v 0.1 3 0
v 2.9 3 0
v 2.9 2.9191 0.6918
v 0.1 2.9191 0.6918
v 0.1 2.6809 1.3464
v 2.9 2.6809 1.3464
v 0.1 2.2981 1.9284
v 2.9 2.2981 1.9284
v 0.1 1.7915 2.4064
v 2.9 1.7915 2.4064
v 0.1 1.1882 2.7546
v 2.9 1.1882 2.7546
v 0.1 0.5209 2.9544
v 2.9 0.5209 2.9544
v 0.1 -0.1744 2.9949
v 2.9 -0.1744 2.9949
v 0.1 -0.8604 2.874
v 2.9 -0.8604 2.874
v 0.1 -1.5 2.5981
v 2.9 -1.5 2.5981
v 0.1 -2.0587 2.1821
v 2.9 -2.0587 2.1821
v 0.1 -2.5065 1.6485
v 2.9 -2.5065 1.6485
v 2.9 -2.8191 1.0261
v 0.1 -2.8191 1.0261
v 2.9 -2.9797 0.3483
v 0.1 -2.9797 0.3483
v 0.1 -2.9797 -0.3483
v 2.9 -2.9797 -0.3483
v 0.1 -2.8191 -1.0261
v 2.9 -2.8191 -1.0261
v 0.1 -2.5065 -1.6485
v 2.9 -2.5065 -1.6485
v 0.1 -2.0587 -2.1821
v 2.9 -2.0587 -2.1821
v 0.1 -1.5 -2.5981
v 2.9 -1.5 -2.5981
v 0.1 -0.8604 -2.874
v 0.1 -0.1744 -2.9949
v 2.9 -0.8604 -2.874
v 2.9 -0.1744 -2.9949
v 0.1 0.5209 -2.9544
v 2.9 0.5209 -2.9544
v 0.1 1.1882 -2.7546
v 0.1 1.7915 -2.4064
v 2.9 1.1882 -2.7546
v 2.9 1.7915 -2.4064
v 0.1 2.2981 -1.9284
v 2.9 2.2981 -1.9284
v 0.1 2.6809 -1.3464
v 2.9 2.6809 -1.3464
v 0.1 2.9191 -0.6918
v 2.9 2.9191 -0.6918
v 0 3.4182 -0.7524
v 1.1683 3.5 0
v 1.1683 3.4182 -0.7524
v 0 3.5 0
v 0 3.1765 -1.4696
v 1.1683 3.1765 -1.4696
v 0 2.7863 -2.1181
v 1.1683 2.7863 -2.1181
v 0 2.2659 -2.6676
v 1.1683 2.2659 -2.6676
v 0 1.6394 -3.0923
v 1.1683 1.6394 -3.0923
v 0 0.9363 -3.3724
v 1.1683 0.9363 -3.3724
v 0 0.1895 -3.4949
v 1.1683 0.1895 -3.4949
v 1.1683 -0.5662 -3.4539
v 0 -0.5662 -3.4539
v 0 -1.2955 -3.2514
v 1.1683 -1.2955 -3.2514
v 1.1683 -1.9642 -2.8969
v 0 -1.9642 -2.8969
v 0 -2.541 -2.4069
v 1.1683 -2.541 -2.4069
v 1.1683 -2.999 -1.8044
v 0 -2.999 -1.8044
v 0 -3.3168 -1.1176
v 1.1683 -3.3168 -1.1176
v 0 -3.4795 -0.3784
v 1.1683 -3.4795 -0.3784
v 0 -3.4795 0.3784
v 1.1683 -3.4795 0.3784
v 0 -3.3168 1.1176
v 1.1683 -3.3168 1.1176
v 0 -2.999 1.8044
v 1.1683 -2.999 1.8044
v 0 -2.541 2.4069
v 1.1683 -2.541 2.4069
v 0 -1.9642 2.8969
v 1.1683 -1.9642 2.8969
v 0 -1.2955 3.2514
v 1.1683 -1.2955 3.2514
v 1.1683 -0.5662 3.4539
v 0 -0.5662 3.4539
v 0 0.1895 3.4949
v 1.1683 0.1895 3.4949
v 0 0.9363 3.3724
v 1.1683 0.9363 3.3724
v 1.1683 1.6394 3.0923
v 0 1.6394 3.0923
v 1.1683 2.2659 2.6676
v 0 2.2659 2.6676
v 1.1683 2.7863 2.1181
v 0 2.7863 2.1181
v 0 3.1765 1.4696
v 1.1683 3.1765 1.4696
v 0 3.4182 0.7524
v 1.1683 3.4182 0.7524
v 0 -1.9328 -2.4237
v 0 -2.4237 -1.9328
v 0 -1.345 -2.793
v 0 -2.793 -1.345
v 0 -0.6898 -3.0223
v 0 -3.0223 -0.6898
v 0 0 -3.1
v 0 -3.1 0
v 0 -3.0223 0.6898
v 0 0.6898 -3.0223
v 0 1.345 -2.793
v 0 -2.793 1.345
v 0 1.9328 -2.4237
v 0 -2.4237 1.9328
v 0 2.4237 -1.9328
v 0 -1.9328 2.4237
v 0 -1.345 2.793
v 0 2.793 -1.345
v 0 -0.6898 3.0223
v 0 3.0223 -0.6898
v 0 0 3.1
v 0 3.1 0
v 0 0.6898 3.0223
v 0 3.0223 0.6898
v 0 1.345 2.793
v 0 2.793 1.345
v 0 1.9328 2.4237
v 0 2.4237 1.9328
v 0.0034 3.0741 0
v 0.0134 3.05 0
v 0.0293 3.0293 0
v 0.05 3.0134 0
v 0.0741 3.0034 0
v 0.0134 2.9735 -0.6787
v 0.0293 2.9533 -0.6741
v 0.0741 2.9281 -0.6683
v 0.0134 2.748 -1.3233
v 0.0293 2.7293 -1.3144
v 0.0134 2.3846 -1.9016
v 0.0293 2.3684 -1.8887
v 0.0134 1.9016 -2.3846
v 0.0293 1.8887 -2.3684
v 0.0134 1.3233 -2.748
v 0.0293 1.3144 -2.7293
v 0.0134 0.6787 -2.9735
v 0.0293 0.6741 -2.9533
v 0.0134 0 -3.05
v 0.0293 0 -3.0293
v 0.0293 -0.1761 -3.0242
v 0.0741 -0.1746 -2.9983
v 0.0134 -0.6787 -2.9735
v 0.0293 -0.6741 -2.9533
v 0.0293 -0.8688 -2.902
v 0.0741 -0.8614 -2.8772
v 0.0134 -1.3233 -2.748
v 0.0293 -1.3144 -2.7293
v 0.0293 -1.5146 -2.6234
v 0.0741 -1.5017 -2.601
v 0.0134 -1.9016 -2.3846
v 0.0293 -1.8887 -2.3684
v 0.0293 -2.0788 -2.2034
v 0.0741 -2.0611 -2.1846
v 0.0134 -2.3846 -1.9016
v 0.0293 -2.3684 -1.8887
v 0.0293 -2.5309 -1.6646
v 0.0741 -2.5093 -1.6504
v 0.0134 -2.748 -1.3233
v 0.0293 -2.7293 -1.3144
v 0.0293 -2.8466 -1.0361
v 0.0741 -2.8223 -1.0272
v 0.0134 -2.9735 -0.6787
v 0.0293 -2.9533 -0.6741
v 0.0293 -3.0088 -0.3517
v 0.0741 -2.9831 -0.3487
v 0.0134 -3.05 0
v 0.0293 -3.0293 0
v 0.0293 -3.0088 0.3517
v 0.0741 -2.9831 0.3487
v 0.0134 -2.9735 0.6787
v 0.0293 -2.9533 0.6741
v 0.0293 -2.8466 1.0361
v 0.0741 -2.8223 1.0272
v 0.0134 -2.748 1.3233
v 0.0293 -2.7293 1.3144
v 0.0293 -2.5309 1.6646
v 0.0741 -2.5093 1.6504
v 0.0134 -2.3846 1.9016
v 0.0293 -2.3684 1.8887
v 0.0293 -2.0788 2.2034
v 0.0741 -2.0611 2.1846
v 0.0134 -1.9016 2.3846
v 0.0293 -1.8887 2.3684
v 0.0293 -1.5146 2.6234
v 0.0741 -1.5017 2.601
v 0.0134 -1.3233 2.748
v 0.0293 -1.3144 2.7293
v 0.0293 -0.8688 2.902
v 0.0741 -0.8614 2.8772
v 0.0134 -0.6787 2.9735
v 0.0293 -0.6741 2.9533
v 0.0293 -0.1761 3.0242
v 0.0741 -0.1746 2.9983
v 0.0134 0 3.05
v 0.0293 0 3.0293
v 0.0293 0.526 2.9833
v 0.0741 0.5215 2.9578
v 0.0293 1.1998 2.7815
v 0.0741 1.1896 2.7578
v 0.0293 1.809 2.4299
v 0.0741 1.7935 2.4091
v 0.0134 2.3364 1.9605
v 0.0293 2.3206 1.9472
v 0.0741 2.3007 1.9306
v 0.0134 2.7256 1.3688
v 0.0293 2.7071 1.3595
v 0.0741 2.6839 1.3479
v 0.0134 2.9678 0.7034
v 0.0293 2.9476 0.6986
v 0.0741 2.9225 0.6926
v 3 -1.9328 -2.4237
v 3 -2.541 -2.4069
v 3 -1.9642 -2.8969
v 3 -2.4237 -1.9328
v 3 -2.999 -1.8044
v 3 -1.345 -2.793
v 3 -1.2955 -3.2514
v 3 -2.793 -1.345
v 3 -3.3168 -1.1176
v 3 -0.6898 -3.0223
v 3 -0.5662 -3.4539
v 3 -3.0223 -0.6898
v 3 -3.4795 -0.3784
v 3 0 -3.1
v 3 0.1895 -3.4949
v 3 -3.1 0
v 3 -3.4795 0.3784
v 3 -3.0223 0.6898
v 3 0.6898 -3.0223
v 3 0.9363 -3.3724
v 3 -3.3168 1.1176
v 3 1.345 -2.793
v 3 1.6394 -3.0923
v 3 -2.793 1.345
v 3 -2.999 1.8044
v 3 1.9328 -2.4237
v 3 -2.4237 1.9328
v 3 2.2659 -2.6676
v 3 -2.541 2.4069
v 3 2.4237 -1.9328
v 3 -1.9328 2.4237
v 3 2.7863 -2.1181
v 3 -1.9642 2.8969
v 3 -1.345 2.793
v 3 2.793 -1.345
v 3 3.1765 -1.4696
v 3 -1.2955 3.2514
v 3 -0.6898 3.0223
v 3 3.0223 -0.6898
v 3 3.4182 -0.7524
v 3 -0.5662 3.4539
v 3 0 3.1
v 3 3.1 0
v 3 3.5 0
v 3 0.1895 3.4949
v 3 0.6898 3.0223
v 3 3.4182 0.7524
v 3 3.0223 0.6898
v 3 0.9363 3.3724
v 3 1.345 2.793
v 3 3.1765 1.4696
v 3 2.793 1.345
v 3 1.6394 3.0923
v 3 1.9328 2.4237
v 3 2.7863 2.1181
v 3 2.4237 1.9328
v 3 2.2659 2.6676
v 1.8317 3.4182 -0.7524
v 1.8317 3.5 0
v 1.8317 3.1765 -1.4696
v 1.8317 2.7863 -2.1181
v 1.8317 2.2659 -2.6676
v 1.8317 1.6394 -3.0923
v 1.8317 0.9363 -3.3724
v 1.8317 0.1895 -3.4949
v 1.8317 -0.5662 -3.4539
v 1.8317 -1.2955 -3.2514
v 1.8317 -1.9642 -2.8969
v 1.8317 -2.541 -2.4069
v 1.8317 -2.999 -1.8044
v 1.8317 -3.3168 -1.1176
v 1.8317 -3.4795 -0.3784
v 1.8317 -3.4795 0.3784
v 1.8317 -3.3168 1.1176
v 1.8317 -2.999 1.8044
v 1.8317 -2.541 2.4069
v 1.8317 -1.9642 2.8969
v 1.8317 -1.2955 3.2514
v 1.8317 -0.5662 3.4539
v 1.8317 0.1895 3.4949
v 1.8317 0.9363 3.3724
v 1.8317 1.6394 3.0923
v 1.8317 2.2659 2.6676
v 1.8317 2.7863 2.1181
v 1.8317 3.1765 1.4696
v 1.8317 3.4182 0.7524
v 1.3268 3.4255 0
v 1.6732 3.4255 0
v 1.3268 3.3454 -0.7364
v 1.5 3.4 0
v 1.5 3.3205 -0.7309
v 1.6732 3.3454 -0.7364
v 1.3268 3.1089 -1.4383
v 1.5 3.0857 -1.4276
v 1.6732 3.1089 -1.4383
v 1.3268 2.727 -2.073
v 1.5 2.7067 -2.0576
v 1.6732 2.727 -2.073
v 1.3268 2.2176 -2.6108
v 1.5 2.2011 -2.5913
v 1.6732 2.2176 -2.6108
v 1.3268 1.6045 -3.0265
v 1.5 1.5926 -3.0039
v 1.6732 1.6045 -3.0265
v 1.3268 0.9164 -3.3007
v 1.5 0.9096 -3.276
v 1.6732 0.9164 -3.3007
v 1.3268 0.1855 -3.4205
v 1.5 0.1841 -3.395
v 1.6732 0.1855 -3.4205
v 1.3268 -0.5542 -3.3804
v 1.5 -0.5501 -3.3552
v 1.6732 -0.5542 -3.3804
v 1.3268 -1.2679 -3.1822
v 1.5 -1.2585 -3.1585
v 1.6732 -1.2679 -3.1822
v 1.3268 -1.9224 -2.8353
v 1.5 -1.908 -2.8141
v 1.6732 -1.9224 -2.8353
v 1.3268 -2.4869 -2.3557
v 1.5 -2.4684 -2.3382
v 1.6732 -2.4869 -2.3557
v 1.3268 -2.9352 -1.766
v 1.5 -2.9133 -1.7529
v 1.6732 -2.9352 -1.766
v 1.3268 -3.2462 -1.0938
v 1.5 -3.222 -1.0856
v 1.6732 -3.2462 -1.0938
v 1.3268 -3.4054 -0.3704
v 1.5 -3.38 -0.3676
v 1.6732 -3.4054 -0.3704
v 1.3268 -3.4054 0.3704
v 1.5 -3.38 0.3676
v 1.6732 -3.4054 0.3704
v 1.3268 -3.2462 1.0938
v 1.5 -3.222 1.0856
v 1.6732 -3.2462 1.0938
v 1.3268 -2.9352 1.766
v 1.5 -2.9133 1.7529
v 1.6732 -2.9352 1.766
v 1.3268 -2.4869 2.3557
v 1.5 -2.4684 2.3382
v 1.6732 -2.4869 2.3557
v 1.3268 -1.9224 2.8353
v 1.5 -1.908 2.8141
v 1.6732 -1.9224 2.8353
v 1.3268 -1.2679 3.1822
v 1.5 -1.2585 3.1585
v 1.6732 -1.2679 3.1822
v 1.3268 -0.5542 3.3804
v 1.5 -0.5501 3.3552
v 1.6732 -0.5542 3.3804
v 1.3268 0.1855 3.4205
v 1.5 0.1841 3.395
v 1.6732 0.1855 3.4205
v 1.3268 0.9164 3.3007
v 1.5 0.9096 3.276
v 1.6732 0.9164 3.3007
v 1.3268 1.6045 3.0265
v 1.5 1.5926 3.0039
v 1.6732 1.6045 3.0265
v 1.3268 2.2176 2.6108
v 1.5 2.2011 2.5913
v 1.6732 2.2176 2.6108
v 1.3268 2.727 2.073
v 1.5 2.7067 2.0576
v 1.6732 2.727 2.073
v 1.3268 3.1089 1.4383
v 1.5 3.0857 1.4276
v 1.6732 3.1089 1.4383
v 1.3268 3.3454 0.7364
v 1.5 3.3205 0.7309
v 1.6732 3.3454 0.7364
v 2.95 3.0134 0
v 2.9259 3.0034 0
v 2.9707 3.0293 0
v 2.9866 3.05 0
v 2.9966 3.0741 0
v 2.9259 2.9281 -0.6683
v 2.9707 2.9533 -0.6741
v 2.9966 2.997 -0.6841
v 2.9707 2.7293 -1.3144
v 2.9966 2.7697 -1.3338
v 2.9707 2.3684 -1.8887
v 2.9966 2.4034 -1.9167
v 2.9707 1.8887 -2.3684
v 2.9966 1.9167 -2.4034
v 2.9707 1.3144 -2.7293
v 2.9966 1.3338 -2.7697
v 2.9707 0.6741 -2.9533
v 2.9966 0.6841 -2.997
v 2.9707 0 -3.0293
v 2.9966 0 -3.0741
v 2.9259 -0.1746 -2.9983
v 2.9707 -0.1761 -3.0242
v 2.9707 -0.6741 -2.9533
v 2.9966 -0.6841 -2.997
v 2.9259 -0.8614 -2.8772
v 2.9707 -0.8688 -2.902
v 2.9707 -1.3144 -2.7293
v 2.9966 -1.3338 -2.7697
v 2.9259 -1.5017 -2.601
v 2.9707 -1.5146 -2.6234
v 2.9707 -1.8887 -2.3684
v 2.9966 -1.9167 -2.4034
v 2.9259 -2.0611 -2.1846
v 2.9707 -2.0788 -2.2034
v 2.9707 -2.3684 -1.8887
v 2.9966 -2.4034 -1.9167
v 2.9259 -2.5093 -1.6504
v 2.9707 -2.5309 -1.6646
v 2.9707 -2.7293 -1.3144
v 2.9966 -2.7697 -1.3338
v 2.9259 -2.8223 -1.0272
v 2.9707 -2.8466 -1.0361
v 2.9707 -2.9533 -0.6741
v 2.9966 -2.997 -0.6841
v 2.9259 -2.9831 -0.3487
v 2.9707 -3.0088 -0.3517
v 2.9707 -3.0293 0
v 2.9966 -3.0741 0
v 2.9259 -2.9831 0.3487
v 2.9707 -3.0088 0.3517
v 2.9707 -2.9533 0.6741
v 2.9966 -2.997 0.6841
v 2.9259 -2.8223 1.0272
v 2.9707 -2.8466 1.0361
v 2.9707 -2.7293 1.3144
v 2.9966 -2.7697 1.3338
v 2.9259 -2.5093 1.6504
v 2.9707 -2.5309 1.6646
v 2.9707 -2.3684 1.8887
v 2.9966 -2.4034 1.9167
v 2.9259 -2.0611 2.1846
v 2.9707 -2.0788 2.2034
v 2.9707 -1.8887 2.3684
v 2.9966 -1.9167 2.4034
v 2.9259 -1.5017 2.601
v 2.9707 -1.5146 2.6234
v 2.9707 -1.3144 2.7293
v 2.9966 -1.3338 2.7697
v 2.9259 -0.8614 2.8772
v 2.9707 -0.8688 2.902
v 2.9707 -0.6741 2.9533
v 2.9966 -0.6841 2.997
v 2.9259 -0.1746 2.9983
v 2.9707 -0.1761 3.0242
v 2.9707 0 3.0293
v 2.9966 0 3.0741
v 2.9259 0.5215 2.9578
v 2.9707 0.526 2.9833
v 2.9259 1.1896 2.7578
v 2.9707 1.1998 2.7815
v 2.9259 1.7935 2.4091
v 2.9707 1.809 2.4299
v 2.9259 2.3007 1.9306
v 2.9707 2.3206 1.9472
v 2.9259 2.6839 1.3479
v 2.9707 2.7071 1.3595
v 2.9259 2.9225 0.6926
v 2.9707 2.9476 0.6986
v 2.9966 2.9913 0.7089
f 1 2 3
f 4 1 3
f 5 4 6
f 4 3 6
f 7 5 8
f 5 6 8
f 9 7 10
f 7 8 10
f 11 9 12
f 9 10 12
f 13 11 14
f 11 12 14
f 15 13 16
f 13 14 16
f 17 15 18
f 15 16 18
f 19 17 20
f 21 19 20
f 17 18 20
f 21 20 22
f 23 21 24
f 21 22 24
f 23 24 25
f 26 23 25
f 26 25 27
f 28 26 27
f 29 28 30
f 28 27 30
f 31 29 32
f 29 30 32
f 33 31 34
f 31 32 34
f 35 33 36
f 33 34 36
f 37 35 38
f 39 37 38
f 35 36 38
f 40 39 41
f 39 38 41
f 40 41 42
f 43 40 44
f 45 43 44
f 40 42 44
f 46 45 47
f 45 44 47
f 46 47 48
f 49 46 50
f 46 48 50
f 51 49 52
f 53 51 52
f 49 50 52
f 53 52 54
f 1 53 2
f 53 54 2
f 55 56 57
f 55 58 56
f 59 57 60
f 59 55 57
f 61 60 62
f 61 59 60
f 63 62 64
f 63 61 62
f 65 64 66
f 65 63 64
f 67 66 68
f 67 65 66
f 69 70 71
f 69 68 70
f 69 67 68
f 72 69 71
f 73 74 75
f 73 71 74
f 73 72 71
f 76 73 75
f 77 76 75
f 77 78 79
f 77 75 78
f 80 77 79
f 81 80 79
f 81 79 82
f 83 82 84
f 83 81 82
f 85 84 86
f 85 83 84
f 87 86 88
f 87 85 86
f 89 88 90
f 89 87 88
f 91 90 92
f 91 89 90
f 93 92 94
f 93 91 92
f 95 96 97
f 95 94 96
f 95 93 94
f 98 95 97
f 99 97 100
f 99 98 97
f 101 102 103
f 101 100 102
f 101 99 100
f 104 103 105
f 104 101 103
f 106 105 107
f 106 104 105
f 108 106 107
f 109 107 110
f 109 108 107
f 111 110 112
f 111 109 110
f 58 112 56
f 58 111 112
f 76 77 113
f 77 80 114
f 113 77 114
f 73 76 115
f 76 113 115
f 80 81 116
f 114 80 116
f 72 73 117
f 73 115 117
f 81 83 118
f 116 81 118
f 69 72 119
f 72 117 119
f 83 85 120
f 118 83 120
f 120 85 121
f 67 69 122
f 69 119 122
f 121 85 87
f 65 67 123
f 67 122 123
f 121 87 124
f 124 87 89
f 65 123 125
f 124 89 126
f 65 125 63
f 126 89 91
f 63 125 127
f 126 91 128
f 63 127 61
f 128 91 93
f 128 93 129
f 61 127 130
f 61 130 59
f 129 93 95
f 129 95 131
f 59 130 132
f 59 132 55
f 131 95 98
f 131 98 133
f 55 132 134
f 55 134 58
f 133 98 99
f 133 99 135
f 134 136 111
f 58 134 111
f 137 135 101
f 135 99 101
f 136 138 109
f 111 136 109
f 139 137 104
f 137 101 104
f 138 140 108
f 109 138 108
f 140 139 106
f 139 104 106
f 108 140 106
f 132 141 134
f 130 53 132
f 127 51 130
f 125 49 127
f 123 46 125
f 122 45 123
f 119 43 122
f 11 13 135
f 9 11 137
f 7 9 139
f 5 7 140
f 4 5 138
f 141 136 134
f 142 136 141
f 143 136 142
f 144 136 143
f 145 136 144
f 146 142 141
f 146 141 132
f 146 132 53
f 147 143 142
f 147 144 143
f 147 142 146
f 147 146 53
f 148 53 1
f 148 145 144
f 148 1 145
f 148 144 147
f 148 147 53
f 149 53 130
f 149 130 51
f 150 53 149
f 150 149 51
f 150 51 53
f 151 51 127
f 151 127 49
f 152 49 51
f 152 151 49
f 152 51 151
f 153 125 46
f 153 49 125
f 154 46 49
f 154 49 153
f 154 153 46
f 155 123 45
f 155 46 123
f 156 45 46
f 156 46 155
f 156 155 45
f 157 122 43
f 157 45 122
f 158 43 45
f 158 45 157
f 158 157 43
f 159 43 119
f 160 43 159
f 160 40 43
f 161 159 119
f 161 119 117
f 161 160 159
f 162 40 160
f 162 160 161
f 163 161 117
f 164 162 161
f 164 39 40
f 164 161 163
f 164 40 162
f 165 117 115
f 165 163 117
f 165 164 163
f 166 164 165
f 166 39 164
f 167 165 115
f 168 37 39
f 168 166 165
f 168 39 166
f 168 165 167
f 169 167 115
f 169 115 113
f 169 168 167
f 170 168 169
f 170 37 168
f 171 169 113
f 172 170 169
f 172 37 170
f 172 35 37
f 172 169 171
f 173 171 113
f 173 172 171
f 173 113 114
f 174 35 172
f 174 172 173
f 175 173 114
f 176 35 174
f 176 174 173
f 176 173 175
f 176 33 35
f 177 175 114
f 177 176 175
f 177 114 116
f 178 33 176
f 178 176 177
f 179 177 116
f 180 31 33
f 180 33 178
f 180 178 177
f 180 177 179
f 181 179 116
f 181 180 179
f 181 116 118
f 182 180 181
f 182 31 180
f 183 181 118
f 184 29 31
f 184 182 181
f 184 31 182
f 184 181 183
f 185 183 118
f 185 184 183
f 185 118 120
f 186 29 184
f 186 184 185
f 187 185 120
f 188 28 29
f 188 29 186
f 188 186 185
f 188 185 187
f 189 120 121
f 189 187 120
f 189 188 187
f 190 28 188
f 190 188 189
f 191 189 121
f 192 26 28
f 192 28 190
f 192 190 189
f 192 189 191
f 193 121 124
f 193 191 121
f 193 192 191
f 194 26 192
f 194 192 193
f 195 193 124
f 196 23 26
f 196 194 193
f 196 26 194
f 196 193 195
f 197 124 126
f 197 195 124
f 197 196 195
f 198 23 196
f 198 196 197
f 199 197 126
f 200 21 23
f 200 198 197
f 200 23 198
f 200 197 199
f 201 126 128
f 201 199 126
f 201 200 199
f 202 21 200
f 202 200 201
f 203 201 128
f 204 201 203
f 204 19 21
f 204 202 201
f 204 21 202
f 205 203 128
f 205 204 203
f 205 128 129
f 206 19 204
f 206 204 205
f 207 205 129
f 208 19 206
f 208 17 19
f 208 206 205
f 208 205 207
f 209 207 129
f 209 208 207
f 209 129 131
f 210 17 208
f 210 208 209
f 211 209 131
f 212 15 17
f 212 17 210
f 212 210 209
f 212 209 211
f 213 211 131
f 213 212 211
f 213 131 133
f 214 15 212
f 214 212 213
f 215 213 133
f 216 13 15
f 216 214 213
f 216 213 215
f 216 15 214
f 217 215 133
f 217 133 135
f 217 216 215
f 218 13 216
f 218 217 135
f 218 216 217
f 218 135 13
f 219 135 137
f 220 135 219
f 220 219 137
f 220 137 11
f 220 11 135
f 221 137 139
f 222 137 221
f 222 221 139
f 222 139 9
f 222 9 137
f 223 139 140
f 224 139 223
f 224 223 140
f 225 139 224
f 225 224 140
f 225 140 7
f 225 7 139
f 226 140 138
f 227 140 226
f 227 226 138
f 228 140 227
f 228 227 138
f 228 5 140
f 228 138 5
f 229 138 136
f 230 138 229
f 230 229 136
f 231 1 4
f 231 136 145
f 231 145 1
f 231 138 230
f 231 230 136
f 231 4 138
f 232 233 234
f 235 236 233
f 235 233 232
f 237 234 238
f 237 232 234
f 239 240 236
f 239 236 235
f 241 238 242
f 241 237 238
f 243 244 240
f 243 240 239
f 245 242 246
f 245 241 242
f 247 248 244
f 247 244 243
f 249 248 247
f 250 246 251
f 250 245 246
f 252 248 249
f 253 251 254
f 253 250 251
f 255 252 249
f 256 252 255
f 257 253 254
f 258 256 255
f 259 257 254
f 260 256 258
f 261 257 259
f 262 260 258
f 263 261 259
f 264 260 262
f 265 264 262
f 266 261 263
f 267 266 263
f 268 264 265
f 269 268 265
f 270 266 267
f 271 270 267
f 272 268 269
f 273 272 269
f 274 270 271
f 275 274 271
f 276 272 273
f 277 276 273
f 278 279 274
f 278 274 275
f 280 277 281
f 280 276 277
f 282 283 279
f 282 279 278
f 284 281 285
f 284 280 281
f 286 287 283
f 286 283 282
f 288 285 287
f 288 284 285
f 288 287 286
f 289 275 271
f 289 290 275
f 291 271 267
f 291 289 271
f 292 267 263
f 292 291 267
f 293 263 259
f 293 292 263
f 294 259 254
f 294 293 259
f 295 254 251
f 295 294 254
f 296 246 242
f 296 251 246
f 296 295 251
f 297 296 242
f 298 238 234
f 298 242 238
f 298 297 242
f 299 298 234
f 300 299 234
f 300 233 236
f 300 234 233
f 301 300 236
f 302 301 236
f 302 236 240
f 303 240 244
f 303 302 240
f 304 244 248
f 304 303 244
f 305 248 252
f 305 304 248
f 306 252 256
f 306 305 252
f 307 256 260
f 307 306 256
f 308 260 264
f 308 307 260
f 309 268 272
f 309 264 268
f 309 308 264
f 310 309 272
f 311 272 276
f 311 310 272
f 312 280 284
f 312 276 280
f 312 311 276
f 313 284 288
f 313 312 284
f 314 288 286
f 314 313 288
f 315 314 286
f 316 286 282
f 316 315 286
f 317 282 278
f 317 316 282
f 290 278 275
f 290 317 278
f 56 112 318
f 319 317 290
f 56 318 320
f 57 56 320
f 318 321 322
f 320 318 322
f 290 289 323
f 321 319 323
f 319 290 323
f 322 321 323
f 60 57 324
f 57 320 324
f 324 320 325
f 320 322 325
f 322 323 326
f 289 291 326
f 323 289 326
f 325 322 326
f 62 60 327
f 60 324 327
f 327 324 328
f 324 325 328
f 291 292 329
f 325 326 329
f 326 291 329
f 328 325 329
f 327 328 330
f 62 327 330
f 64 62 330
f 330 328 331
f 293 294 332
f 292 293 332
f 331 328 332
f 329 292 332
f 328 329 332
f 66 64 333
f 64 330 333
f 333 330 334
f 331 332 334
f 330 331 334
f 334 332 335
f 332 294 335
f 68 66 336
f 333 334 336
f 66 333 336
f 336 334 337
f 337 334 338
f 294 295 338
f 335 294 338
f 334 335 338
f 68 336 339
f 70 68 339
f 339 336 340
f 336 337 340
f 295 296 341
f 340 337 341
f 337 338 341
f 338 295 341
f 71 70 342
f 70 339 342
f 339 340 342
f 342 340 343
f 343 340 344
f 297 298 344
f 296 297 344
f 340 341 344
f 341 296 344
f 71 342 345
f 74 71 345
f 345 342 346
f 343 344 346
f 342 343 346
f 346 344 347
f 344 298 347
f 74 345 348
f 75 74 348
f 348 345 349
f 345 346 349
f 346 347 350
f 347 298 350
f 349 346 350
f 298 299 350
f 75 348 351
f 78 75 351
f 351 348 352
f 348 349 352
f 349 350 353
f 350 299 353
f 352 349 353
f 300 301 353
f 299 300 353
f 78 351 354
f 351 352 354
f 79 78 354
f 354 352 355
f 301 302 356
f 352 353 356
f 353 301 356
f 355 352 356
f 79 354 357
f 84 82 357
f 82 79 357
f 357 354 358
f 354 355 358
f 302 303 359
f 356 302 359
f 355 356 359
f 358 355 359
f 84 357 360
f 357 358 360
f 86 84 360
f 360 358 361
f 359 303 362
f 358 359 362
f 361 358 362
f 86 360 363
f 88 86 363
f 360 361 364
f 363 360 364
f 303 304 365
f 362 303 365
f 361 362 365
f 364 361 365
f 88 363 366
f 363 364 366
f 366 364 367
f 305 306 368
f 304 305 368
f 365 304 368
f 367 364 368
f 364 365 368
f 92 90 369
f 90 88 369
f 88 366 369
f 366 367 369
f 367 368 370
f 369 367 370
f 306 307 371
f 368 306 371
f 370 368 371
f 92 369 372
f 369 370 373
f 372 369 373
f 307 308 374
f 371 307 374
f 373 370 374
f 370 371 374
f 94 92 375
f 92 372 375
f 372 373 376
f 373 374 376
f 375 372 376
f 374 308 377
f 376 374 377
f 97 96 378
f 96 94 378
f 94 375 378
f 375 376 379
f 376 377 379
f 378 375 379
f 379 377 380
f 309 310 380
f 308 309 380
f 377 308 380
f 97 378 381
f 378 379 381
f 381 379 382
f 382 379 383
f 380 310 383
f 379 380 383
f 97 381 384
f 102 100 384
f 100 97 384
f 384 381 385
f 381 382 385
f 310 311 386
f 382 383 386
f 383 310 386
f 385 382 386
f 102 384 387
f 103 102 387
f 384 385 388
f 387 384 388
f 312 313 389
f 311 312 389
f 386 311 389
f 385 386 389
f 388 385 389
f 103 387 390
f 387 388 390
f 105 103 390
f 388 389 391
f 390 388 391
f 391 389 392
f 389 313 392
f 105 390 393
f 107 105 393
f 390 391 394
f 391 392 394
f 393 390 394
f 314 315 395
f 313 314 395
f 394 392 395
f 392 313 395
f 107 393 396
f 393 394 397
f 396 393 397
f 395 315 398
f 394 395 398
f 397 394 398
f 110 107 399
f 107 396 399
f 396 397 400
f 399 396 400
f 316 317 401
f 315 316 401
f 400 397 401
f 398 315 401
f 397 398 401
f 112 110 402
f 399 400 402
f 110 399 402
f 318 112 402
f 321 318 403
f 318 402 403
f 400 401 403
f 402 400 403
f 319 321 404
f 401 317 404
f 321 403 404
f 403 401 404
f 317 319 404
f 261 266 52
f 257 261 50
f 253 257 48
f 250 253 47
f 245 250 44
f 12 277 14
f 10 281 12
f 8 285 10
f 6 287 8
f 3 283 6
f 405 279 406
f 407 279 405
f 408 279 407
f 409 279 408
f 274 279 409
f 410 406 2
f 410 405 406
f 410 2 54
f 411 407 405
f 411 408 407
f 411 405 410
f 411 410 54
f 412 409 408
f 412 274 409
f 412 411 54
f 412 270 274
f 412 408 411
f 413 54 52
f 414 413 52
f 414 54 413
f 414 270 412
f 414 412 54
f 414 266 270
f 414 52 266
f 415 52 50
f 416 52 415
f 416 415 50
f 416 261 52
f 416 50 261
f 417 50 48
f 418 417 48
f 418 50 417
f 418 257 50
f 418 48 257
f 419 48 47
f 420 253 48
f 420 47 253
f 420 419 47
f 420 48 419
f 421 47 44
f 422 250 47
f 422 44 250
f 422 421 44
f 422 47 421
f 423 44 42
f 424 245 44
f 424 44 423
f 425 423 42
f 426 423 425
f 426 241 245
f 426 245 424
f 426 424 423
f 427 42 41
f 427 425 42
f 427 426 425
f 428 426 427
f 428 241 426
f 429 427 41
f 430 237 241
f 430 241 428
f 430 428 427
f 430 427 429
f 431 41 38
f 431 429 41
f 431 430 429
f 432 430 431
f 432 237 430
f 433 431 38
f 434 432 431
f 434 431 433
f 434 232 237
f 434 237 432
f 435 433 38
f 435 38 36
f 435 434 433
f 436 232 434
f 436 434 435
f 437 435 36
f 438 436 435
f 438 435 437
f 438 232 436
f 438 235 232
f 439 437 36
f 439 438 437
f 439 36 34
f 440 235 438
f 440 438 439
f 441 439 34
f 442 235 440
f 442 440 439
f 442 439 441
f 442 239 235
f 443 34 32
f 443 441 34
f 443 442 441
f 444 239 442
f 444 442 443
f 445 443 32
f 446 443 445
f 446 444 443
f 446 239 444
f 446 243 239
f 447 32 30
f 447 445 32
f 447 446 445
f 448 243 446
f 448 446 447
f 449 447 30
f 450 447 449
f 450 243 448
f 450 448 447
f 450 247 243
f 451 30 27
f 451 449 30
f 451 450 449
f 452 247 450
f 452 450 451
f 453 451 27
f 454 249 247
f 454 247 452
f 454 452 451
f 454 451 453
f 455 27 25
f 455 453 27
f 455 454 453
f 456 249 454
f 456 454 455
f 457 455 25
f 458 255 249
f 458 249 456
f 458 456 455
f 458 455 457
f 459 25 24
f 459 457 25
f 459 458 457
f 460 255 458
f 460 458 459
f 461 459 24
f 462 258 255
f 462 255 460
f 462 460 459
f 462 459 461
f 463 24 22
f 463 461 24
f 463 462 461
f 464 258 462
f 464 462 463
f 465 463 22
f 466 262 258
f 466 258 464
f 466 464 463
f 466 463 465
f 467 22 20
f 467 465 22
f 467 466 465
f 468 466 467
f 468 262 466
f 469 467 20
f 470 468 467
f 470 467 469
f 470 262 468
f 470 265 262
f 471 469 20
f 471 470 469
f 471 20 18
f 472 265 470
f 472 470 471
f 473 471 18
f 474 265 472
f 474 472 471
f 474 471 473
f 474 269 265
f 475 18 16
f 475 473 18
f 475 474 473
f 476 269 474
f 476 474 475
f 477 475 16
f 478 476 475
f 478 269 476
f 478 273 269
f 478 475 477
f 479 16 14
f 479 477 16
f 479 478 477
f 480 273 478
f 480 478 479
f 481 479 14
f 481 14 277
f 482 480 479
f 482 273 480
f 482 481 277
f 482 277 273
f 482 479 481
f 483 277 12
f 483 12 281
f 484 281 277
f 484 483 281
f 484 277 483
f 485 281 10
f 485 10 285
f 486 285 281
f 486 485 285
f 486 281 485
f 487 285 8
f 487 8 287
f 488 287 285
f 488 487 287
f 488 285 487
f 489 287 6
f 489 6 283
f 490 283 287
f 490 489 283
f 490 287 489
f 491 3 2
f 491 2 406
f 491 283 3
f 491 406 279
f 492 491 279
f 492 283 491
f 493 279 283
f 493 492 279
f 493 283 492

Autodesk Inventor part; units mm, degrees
sketch "Sketch_1" plane through (0, 0, 0) normal (0, 0, 1) x (1, 0, 0)
  line L0 (3, 0) -> (0, 0)
  arc A0 (0, 3.1) -> (0.1, 3) centre (0.1, 3.1) ccw
  line L1 (0.1, 3) -> (2.9, 3)
  arc A1 (2.9, 3) -> (3, 3.1) centre (2.9, 3.1) ccw
  line L2 (3, 3.1) -> (3, 3.5)
  line L3 (3, 3.5) -> (1.8317, 3.5)
  arc A2 (1.1683, 3.5) -> (1.8317, 3.5) centre (1.5, 4) ccw
  line L4 (1.1683, 3.5) -> (0, 3.5)
  line L5 (0, 3.5) -> (0, 3.1)
revolve "Revolution1" add sketch "Sketch_1" angle 360 about axis through (3, 0, 0) along (1, 0, 0)
ref_plane "ip_st_1_1_XY" through (1.5, 4, 0) normal (1, 0, 0) x (0, 0, -1)
ref_plane "ip_st_1_1_YZ" through (1.5, 4, 0) normal (0, 0, -1) x (0, 1, 0)
ref_plane "ip_st_1_1_ZX" through (1.5, 4, 0) normal (0, 1, 0) x (1, 0, 0)
ref_plane "ip_st_1_10_XY" through (1.5, -3.6955, -1.5307) normal (1, 0, 0) x (0, 0, -1)
ref_plane "ip_st_1_10_YZ" through (1.5, -3.6955, -1.5307) normal (0, 0, -1) x (0, 1, 0)
ref_plane "ip_st_1_10_ZX" through (1.5, -3.6955, -1.5307) normal (0, 1, 0) x (1, 0, 0)
ref_plane "ip_st_1_11_XY" through (1.5, -2.8284, -2.8284) normal (1, 0, 0) x (0, 0, -1)
ref_plane "ip_st_1_11_YZ" through (1.5, -2.8284, -2.8284) normal (0, 0, -1) x (0, 1, 0)
ref_plane "ip_st_1_11_ZX" through (1.5, -2.8284, -2.8284) normal (0, 1, 0) x (1, 0, 0)
ref_plane "ip_st_1_12_XY" through (1.5, -1.5307, -3.6955) normal (1, 0, 0) x (0, 0, -1)
ref_plane "ip_st_1_12_YZ" through (1.5, -1.5307, -3.6955) normal (0, 0, -1) x (0, 1, 0)
ref_plane "ip_st_1_12_ZX" through (1.5, -1.5307, -3.6955) normal (0, 1, 0) x (1, 0, 0)
ref_plane "ip_st_1_13_XY" through (1.5, 0, -4) normal (1, 0, 0) x (0, 0, -1)
ref_plane "ip_st_1_13_YZ" through (1.5, 0, -4) normal (0, 0, -1) x (0, 1, 0)
ref_plane "ip_st_1_13_ZX" through (1.5, 0, -4) normal (0, 1, 0) x (1, 0, 0)
ref_plane "ip_st_1_14_XY" through (1.5, 1.5307, -3.6955) normal (1, 0, 0) x (0, 0, -1)
ref_plane "ip_st_1_14_YZ" through (1.5, 1.5307, -3.6955) normal (0, 0, -1) x (0, 1, 0)
ref_plane "ip_st_1_14_ZX" through (1.5, 1.5307, -3.6955) normal (0, 1, 0) x (1, 0, 0)
ref_plane "ip_st_1_15_XY" through (1.5, 2.8284, -2.8284) normal (1, 0, 0) x (0, 0, -1)
ref_plane "ip_st_1_15_YZ" through (1.5, 2.8284, -2.8284) normal (0, 0, -1) x (0, 1, 0)
ref_plane "ip_st_1_15_ZX" through (1.5, 2.8284, -2.8284) normal (0, 1, 0) x (1, 0, 0)
ref_plane "ip_st_1_16_XY" through (1.5, 3.6955, -1.5307) normal (1, 0, 0) x (0, 0, -1)
ref_plane "ip_st_1_16_YZ" through (1.5, 3.6955, -1.5307) normal (0, 0, -1) x (0, 1, 0)
ref_plane "ip_st_1_16_ZX" through (1.5, 3.6955, -1.5307) normal (0, 1, 0) x (1, 0, 0)
ref_plane "ip_st_1_2_XY" through (1.5, 3.6955, 1.5307) normal (1, 0, 0) x (0, 0, -1)
ref_plane "ip_st_1_2_YZ" through (1.5, 3.6955, 1.5307) normal (0, 0, -1) x (0, 1, 0)
ref_plane "ip_st_1_2_ZX" through (1.5, 3.6955, 1.5307) normal (0, 1, 0) x (1, 0, 0)
ref_plane "ip_st_1_3_XY" through (1.5, 2.8284, 2.8284) normal (1, 0, 0) x (0, 0, -1)
ref_plane "ip_st_1_3_YZ" through (1.5, 2.8284, 2.8284) normal (0, 0, -1) x (0, 1, 0)
ref_plane "ip_st_1_3_ZX" through (1.5, 2.8284, 2.8284) normal (0, 1, 0) x (1, 0, 0)
ref_plane "ip_st_1_4_XY" through (1.5, 1.5307, 3.6955) normal (1, 0, 0) x (0, 0, -1)
ref_plane "ip_st_1_4_YZ" through (1.5, 1.5307, 3.6955) normal (0, 0, -1) x (0, 1, 0)
ref_plane "ip_st_1_4_ZX" through (1.5, 1.5307, 3.6955) normal (0, 1, 0) x (1, 0, 0)
ref_plane "ip_st_1_5_XY" through (1.5, 0, 4) normal (1, 0, 0) x (0, 0, -1)
ref_plane "ip_st_1_5_YZ" through (1.5, 0, 4) normal (0, 0, -1) x (0, 1, 0)
ref_plane "ip_st_1_5_ZX" through (1.5, 0, 4) normal (0, 1, 0) x (1, 0, 0)
ref_plane "ip_st_1_6_XY" through (1.5, -1.5307, 3.6955) normal (1, 0, 0) x (0, 0, -1)
ref_plane "ip_st_1_6_YZ" through (1.5, -1.5307, 3.6955) normal (0, 0, -1) x (0, 1, 0)
ref_plane "ip_st_1_6_ZX" through (1.5, -1.5307, 3.6955) normal (0, 1, 0) x (1, 0, 0)
ref_plane "ip_st_1_7_XY" through (1.5, -2.8284, 2.8284) normal (1, 0, 0) x (0, 0, -1)
ref_plane "ip_st_1_7_YZ" through (1.5, -2.8284, 2.8284) normal (0, 0, -1) x (0, 1, 0)
ref_plane "ip_st_1_7_ZX" through (1.5, -2.8284, 2.8284) normal (0, 1, 0) x (1, 0, 0)
ref_plane "ip_st_1_8_XY" through (1.5, -3.6955, 1.5307) normal (1, 0, 0) x (0, 0, -1)
ref_plane "ip_st_1_8_YZ" through (1.5, -3.6955, 1.5307) normal (0, 0, -1) x (0, 1, 0)
ref_plane "ip_st_1_8_ZX" through (1.5, -3.6955, 1.5307) normal (0, 1, 0) x (1, 0, 0)
ref_plane "ip_st_1_9_XY" through (1.5, -4, 0) normal (1, 0, 0) x (0, 0, -1)
ref_plane "ip_st_1_9_YZ" through (1.5, -4, 0) normal (0, 0, -1) x (0, 1, 0)
ref_plane "ip_st_1_9_ZX" through (1.5, -4, 0) normal (0, 1, 0) x (1, 0, 0)
ref_plane "ip_st_1a_XY" through (0, 0, 0) normal (1, 0, 0) x (0, 0, -1)
ref_plane "ip_st_1a_YZ" through (0, 0, 0) normal (0, 0, -1) x (0, 1, 0)
ref_plane "ip_st_1a_ZX" through (0, 0, 0) normal (0, 1, 0) x (1, 0, 0)
ref_plane "ip_st_2a_XY" through (0.1875, 0, 0) normal (1, 0, 0) x (0, 0, -1)
ref_plane "ip_st_2a_YZ" through (0.1875, 0, 0) normal (0, 0, -1) x (0, 1, 0)
ref_plane "ip_st_2a_ZX" through (0.1875, 0, 0) normal (0, 1, 0) x (1, 0, 0)
properties part number "MF106ZZ1 Inner Ring"
